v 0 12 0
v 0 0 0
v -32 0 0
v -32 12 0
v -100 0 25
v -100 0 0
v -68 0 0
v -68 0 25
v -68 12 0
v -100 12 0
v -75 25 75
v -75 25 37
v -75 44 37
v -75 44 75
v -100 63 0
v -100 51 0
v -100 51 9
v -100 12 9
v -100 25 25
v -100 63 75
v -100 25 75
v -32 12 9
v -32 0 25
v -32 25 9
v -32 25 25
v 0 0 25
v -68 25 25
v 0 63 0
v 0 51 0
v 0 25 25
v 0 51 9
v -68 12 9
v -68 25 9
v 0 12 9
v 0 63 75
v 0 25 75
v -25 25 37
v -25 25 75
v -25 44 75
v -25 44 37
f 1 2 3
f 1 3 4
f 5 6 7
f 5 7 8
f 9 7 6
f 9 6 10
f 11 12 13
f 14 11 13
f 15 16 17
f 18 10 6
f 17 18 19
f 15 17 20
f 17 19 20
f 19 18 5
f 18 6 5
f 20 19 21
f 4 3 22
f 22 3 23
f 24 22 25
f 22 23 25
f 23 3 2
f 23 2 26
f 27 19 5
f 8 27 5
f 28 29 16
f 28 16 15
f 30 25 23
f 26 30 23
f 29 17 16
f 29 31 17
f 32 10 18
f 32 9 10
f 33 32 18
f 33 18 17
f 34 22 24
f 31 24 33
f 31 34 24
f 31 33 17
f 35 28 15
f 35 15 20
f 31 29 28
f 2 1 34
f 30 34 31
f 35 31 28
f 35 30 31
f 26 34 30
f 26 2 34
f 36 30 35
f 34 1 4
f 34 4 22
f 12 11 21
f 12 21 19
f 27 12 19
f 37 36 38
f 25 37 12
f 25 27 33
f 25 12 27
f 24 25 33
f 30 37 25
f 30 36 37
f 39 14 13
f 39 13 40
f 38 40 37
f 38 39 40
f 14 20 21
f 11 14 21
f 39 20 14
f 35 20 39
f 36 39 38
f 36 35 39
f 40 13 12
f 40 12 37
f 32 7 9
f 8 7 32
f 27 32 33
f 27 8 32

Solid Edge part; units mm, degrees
sketch "Sketch1" plane through (0, 0, 0) normal (1, 0, 0) x (0, 1, 0)
  line L0 (25, 75) -> (25, 25)
  line L1 (25, 25) -> (0, 25)
  line L2 (0, 0) -> (0, 25)
  line L3 (0, 0) -> (12, 0)
  line L4 (12, 0) -> (12, 9)
  line L5 (12, 9) -> (51, 9)
  line L6 (51, 9) -> (51, 0)
  line L7 (51, 0) -> (63, 0)
  line L8 (63, 0) -> (63, 75)
  line L9 (63, 75) -> (25, 75)
extrude "Protrusion1" add sketch "Sketch1" against normal blind 100
sketch "Sketch2" plane through (-50, 44, 75) normal (0, 0, 1) x (1, 0, 0)
  line L0 (25, 0) -> (25, -19)
  line L1 (-25, 0) -> (25, 0)
  line L2 (-25, -19) -> (-25, 0)
extrude "ExtrudedCutout_2" cut sketch "Sketch2" against normal blind 38 material side at (-25.05, 34.5, 75)
sketch "Sketch3" plane through (-50, 12.5, 25) normal (0, 0, 1) x (1, 0, 0)
  line L0 (18, -12.5) -> (18, 12.5)
  line L1 (18, 12.5) -> (-18, 12.5)
  line L2 (-18, -12.5) -> (-18, 12.5)
extrude "ExtrudedCutout_3" cut sketch "Sketch3" against normal blind 71.1799 material side at (-32.05, 12.5, 25)
